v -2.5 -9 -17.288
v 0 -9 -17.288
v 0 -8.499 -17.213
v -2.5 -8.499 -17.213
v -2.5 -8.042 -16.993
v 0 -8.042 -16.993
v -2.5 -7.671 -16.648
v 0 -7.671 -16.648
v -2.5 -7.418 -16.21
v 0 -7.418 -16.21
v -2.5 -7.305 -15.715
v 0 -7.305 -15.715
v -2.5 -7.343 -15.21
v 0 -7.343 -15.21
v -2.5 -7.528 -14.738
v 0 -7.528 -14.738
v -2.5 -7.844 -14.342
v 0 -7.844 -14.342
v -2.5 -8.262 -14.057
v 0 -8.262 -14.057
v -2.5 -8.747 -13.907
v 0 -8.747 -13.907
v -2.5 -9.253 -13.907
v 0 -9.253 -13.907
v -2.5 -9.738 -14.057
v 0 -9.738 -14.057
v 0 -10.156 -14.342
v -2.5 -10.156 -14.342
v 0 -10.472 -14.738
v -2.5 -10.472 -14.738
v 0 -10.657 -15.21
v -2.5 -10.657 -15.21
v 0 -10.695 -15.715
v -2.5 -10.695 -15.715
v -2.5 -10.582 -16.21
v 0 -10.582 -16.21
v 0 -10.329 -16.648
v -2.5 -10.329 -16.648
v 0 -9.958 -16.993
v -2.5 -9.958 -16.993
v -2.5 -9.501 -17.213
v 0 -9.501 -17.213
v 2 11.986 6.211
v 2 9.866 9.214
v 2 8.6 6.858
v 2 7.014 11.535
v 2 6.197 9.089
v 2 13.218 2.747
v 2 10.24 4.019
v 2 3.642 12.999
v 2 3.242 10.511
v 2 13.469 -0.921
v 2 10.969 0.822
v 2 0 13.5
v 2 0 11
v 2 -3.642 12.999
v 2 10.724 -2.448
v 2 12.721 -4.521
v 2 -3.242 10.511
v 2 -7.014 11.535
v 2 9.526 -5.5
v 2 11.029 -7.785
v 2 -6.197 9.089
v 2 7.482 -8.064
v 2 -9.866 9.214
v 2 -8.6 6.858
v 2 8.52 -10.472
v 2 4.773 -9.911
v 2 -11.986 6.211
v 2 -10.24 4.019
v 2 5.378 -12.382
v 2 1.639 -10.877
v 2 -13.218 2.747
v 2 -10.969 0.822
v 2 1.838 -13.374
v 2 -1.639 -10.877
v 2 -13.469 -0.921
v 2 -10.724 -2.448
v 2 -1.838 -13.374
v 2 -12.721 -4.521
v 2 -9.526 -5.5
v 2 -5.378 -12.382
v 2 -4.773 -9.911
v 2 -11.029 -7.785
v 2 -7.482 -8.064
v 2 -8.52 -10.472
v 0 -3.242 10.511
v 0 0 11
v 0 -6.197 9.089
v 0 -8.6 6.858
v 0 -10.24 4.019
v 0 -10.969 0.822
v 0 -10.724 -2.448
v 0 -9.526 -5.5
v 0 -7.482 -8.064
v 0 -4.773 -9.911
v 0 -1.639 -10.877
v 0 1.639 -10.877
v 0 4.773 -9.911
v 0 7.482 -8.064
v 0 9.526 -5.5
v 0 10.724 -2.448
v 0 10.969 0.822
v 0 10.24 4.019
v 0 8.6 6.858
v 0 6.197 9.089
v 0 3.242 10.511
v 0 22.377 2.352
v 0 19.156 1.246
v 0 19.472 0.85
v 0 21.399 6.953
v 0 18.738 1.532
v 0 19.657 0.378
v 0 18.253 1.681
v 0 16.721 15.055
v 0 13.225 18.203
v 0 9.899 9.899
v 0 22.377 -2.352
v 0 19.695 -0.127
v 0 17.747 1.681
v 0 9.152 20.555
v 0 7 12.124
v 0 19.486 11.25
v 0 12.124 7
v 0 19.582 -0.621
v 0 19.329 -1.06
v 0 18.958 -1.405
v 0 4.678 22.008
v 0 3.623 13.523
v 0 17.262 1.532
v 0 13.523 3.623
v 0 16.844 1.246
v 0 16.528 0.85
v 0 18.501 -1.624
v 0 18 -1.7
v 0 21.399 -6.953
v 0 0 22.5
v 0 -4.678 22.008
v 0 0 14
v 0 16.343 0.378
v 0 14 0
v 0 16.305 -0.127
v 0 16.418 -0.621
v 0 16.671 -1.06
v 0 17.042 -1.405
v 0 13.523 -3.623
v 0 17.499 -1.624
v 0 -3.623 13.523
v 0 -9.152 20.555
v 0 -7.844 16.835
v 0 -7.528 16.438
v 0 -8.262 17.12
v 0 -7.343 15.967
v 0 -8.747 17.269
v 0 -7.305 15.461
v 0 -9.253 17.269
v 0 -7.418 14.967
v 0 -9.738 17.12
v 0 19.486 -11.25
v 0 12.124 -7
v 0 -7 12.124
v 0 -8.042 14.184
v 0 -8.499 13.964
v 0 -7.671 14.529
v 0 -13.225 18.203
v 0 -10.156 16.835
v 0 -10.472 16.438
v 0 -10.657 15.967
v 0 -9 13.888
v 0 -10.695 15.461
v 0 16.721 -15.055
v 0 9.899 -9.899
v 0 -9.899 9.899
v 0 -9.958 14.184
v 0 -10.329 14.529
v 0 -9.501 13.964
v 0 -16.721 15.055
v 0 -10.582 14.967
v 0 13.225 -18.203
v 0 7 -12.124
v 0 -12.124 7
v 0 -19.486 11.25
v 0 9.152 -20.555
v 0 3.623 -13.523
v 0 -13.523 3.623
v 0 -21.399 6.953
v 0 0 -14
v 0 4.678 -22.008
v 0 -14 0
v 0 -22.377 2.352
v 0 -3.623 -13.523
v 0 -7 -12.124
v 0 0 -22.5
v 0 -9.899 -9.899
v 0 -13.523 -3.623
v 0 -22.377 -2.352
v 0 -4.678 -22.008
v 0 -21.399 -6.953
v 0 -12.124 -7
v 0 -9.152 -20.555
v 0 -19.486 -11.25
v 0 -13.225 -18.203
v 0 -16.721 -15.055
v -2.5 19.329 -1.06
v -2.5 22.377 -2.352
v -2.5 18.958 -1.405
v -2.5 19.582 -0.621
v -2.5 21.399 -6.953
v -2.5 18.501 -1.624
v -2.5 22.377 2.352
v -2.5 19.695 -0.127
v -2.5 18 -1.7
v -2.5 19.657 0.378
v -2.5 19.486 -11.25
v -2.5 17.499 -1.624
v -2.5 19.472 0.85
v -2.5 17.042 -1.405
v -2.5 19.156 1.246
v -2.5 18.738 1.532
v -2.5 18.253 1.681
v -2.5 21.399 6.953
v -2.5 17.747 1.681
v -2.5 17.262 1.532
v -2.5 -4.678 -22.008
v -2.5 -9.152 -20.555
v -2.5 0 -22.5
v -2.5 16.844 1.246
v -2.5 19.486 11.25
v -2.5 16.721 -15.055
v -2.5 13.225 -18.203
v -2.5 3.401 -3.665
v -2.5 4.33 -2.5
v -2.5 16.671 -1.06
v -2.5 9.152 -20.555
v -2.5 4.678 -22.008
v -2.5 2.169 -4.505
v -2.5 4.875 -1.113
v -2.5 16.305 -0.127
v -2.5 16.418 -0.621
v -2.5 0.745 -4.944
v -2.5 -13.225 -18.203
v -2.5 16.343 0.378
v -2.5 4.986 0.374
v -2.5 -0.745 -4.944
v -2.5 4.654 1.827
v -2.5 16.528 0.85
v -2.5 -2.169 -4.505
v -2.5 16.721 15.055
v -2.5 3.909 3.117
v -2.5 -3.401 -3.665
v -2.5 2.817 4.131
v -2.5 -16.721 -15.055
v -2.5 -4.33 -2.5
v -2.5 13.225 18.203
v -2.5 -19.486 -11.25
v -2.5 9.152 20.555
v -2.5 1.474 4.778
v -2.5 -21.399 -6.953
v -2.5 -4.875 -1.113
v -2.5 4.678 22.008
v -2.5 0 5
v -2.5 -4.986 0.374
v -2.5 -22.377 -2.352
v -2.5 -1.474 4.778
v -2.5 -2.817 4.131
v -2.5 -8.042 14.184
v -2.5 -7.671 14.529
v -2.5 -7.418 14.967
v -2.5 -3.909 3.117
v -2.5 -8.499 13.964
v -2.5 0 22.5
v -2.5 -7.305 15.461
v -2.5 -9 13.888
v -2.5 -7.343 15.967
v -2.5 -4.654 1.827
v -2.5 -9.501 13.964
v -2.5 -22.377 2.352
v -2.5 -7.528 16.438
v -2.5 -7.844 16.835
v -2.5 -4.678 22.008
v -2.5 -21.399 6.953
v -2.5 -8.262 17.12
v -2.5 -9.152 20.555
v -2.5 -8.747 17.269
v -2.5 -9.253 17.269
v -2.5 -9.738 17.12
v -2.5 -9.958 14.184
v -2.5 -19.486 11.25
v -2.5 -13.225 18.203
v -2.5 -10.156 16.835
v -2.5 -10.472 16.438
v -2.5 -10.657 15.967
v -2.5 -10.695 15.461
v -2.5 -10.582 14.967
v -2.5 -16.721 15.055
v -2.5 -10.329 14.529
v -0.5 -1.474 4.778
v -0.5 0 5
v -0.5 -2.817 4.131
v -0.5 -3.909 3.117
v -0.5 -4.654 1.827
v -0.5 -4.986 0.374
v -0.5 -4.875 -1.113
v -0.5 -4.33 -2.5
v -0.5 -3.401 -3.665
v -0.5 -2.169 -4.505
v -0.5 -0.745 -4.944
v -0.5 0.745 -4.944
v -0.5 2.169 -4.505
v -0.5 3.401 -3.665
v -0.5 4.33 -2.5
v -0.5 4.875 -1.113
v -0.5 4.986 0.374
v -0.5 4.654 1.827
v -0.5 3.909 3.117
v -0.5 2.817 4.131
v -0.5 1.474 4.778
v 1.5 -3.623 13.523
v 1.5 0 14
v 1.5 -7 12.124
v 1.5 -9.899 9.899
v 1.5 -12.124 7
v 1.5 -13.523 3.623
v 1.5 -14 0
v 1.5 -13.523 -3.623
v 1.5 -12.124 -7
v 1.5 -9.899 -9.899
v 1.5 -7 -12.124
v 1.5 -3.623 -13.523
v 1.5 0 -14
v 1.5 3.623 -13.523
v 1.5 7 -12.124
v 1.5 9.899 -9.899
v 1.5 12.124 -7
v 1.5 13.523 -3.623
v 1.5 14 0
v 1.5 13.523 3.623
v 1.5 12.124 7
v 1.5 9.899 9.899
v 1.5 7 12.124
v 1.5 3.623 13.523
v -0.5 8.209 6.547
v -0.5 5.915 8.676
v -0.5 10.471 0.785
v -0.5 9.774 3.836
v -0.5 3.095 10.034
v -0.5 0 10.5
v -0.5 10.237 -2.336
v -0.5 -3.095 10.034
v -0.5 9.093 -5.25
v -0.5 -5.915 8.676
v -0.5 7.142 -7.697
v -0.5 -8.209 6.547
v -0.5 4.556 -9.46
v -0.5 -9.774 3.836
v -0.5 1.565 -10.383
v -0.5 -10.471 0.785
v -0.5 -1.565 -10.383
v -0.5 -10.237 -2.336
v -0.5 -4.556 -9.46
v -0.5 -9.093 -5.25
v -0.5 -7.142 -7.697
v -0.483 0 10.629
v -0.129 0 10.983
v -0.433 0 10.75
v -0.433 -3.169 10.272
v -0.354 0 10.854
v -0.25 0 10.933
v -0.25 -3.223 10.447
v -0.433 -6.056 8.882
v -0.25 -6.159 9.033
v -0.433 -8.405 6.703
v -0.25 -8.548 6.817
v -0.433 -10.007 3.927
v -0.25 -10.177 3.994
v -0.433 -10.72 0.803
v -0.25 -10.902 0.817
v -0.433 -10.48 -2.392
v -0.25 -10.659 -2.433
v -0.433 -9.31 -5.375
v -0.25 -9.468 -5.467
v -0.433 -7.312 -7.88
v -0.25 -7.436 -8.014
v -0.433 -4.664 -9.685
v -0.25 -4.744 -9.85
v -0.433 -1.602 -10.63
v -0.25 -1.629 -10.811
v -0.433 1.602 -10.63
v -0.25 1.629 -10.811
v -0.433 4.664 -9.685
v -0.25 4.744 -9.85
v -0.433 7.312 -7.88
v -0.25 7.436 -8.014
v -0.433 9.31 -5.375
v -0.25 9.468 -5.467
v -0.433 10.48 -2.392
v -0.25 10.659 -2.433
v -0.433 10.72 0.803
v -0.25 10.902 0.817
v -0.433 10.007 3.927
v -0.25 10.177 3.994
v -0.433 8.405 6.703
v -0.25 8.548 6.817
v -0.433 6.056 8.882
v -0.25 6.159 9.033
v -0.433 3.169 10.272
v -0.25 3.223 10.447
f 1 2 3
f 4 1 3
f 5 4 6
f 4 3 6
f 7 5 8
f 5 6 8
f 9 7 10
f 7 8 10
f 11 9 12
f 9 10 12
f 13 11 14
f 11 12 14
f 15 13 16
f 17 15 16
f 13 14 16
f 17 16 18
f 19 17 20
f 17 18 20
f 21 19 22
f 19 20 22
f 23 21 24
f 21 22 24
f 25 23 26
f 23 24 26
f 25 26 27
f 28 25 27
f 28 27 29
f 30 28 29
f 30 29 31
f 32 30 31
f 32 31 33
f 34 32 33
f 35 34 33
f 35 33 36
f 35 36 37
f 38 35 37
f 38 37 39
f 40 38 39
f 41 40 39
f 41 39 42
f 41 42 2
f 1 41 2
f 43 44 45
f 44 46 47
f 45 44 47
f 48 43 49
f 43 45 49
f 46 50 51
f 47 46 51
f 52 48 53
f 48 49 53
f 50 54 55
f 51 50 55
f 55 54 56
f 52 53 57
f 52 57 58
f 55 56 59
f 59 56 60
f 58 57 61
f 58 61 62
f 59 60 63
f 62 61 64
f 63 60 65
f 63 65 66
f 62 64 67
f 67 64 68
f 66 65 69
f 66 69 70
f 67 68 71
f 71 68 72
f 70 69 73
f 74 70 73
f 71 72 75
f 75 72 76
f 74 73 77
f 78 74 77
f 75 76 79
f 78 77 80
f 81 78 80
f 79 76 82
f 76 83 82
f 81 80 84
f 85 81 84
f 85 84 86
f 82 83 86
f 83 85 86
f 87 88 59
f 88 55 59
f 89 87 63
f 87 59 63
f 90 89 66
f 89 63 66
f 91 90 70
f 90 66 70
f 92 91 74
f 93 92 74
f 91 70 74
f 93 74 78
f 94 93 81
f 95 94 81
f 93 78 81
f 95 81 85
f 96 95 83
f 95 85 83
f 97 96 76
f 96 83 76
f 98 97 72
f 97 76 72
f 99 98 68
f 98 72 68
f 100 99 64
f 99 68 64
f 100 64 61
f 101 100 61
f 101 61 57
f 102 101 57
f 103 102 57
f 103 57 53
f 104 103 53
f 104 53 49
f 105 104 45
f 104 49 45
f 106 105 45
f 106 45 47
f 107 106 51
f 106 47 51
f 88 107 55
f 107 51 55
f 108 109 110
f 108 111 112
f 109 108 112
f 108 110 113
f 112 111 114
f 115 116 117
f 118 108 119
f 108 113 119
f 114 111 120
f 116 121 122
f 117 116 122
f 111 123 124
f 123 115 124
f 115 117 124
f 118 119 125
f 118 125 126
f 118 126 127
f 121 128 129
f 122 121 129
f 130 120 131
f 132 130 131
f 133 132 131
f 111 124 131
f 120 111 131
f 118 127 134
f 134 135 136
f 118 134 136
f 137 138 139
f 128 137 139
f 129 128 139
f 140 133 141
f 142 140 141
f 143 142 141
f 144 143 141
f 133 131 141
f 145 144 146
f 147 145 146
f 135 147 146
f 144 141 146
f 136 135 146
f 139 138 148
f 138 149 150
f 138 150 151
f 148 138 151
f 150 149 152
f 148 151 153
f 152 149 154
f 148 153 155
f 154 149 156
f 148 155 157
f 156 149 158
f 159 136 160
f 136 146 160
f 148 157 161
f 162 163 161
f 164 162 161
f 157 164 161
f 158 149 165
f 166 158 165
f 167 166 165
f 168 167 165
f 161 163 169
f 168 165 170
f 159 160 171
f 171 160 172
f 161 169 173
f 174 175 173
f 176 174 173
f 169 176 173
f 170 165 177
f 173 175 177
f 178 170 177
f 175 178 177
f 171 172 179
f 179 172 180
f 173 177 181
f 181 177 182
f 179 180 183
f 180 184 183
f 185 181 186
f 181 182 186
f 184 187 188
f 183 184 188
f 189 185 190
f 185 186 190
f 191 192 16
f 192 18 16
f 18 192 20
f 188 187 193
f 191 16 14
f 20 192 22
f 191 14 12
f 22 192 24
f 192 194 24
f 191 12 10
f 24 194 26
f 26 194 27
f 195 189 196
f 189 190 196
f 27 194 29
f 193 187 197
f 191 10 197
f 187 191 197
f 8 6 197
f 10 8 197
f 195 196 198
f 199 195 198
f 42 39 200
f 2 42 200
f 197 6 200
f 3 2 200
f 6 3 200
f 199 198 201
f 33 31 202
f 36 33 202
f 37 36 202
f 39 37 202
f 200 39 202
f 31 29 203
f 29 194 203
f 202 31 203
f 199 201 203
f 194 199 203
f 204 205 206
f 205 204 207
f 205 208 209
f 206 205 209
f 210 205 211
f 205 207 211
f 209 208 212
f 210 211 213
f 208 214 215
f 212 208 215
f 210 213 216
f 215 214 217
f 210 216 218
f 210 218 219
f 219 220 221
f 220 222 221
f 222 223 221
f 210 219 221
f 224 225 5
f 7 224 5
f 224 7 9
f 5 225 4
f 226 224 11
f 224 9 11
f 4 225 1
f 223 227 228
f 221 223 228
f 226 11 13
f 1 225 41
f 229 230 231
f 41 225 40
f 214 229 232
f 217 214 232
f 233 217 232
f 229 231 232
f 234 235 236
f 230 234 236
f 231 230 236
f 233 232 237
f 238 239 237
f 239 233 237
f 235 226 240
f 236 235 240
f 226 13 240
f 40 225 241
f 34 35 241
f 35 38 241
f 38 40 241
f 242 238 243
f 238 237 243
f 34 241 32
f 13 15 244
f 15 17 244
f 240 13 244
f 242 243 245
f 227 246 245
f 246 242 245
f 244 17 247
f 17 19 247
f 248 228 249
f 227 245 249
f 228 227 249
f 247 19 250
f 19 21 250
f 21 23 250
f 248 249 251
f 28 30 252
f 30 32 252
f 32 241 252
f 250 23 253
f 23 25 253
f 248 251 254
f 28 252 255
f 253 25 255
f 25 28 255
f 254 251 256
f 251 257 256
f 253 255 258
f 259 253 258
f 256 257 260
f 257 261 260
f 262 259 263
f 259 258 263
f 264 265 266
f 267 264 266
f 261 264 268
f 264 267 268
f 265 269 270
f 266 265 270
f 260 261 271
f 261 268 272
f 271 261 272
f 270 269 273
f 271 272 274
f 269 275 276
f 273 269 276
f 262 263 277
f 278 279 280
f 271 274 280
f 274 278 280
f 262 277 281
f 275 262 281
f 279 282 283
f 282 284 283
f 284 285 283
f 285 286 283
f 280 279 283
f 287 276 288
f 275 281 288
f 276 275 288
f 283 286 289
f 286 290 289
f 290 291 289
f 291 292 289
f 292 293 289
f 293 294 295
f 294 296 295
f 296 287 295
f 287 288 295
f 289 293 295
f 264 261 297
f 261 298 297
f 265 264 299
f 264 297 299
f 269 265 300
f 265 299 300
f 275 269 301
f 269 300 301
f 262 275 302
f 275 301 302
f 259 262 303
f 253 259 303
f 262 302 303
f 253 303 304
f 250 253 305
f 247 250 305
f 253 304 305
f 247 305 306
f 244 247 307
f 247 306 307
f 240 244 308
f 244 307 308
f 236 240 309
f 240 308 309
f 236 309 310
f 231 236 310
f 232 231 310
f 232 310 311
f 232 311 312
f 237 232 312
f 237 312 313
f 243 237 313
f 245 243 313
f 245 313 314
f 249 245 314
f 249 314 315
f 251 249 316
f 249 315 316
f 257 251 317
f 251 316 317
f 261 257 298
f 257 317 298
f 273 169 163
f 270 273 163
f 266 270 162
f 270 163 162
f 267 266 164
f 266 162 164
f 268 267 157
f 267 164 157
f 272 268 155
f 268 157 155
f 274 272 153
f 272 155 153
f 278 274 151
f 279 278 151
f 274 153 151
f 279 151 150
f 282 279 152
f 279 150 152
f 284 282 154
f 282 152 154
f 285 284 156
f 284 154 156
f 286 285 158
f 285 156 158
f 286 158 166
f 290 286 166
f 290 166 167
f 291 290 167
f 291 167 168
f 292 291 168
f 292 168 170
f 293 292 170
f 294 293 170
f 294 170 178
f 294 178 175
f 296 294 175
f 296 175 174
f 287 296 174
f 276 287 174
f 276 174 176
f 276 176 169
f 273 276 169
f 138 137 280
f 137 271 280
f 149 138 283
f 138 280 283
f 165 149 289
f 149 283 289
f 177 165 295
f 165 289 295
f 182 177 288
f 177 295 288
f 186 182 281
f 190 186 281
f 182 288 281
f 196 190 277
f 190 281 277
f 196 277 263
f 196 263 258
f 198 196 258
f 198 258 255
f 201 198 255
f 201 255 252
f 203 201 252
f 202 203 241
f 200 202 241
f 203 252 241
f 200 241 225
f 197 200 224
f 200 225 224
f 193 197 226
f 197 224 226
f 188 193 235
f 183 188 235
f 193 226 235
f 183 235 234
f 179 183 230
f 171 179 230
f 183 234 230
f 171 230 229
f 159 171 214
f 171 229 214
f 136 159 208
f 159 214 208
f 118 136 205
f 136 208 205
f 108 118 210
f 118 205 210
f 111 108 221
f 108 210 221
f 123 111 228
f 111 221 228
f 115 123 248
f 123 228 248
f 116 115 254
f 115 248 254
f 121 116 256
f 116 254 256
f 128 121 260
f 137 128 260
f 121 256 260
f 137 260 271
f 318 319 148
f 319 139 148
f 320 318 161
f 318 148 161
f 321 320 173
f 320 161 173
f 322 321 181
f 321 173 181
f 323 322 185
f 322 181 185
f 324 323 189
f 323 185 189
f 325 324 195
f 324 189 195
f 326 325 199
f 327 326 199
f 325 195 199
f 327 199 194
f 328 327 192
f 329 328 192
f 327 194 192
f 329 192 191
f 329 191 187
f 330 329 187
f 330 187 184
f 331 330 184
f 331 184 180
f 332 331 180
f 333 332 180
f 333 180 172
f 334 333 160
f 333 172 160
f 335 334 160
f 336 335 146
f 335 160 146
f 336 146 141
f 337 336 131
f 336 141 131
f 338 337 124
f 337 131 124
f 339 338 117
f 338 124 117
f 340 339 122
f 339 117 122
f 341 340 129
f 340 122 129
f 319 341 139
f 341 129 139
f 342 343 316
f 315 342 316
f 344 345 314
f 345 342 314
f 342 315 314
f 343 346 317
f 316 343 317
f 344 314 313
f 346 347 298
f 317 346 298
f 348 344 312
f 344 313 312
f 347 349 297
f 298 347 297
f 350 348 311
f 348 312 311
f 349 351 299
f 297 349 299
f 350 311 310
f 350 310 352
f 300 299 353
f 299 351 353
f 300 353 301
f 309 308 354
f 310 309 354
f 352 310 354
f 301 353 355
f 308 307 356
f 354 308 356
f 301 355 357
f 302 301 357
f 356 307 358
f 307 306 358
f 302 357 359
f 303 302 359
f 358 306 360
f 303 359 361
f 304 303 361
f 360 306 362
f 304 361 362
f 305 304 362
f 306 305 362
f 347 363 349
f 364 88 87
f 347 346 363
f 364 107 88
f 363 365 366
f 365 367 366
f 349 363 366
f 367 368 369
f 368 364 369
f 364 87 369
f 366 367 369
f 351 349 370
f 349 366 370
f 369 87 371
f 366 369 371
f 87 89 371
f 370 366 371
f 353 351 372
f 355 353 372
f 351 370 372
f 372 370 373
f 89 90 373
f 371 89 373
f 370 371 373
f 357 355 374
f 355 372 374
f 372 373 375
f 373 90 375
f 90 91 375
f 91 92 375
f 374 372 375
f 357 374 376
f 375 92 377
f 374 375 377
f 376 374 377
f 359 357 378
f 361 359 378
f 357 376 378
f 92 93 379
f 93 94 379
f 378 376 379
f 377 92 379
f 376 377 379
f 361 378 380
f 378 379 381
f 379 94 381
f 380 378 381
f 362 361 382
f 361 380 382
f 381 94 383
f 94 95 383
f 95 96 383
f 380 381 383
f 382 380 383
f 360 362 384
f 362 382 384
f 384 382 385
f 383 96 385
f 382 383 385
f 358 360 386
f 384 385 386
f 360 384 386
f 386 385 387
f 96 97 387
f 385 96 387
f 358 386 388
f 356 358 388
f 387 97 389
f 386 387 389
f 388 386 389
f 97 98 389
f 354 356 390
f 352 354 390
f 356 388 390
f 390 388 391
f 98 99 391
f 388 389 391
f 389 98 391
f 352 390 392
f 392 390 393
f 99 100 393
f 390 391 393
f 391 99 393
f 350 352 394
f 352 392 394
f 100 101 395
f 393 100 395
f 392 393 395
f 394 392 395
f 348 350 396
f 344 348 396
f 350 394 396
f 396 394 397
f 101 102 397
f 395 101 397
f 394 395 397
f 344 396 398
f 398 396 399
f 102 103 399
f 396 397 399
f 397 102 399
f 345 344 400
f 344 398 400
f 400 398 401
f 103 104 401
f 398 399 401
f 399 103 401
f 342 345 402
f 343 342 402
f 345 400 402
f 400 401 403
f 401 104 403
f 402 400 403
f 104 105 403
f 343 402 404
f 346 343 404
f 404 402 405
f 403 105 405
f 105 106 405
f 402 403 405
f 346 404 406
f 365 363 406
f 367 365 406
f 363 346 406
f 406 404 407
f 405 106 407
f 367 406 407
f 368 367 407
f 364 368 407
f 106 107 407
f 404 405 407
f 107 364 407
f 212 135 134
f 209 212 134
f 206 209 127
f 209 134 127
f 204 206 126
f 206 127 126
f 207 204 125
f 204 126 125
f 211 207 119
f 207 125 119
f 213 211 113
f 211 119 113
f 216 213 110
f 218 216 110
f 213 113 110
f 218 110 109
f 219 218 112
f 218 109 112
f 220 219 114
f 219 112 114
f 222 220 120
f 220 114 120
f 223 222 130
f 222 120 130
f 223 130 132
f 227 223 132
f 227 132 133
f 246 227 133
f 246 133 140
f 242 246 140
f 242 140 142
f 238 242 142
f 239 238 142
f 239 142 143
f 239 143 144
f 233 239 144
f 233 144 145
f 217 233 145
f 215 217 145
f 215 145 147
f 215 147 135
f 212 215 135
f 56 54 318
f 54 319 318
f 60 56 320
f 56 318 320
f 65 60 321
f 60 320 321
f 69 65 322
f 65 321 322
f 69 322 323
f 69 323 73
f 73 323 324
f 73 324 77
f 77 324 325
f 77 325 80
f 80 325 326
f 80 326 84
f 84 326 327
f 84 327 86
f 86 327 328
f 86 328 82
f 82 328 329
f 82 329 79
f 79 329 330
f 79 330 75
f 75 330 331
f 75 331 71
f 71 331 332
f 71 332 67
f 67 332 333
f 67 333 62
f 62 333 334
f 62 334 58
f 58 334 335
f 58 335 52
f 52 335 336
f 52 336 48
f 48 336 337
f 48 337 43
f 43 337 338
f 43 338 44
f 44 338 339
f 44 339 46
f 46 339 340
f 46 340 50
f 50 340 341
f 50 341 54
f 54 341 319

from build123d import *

# Parameters (mm, degrees)
ESQUISSE2_R             = 1.7
ENL_V_MAT_EXTRU_1_DEPTH = 10


with BuildPart() as part:
    # Esquisse1 → Révolution1 (revolve)
    with BuildSketch(Plane.XY, mode=Mode.PRIVATE) as r_volution1_sk:
        with BuildLine():
            Line((-0.5, 5), (-0.5, 10.5))
            ThreePointArc((-0.5, 10.5), (-0.353553391, 10.853553391), (0, 11))
            Line((0, 11), (2, 11))
            Line((2, 11), (2, 13.5))
            Line((2, 13.5), (1.5, 14))
            Line((1.5, 14), (0, 14))
            Line((0, 14), (0, 22.5))
            Line((0, 22.5), (-2.5, 22.5))
            Line((-2.5, 22.5), (-2.5, 5))
            Line((-2.5, 5), (-0.5, 5))
        make_face()
    revolve(r_volution1_sk.sketch.rotate(Axis((-14.777796327, 0, 0), (1, 0, 0)), 90), axis=Axis((-14.777796327, 0, 0), (1, 0, 0)))

    # Esquisse2 → Enlèv. mat.-Extru.1 (cut)
    with BuildSketch(Plane(origin=(0, 0, 0), x_dir=(0, 0, -1), z_dir=(1, 0, 0))):
        with Locations((0, 18)):
            Circle(ESQUISSE2_R)
        with Locations((15.588457268, -9)):
            Circle(ESQUISSE2_R)
        with Locations((-15.588457268, -9)):
            Circle(ESQUISSE2_R)
    extrude(amount=-ENL_V_MAT_EXTRU_1_DEPTH, mode=Mode.SUBTRACT)


solid = part.part
